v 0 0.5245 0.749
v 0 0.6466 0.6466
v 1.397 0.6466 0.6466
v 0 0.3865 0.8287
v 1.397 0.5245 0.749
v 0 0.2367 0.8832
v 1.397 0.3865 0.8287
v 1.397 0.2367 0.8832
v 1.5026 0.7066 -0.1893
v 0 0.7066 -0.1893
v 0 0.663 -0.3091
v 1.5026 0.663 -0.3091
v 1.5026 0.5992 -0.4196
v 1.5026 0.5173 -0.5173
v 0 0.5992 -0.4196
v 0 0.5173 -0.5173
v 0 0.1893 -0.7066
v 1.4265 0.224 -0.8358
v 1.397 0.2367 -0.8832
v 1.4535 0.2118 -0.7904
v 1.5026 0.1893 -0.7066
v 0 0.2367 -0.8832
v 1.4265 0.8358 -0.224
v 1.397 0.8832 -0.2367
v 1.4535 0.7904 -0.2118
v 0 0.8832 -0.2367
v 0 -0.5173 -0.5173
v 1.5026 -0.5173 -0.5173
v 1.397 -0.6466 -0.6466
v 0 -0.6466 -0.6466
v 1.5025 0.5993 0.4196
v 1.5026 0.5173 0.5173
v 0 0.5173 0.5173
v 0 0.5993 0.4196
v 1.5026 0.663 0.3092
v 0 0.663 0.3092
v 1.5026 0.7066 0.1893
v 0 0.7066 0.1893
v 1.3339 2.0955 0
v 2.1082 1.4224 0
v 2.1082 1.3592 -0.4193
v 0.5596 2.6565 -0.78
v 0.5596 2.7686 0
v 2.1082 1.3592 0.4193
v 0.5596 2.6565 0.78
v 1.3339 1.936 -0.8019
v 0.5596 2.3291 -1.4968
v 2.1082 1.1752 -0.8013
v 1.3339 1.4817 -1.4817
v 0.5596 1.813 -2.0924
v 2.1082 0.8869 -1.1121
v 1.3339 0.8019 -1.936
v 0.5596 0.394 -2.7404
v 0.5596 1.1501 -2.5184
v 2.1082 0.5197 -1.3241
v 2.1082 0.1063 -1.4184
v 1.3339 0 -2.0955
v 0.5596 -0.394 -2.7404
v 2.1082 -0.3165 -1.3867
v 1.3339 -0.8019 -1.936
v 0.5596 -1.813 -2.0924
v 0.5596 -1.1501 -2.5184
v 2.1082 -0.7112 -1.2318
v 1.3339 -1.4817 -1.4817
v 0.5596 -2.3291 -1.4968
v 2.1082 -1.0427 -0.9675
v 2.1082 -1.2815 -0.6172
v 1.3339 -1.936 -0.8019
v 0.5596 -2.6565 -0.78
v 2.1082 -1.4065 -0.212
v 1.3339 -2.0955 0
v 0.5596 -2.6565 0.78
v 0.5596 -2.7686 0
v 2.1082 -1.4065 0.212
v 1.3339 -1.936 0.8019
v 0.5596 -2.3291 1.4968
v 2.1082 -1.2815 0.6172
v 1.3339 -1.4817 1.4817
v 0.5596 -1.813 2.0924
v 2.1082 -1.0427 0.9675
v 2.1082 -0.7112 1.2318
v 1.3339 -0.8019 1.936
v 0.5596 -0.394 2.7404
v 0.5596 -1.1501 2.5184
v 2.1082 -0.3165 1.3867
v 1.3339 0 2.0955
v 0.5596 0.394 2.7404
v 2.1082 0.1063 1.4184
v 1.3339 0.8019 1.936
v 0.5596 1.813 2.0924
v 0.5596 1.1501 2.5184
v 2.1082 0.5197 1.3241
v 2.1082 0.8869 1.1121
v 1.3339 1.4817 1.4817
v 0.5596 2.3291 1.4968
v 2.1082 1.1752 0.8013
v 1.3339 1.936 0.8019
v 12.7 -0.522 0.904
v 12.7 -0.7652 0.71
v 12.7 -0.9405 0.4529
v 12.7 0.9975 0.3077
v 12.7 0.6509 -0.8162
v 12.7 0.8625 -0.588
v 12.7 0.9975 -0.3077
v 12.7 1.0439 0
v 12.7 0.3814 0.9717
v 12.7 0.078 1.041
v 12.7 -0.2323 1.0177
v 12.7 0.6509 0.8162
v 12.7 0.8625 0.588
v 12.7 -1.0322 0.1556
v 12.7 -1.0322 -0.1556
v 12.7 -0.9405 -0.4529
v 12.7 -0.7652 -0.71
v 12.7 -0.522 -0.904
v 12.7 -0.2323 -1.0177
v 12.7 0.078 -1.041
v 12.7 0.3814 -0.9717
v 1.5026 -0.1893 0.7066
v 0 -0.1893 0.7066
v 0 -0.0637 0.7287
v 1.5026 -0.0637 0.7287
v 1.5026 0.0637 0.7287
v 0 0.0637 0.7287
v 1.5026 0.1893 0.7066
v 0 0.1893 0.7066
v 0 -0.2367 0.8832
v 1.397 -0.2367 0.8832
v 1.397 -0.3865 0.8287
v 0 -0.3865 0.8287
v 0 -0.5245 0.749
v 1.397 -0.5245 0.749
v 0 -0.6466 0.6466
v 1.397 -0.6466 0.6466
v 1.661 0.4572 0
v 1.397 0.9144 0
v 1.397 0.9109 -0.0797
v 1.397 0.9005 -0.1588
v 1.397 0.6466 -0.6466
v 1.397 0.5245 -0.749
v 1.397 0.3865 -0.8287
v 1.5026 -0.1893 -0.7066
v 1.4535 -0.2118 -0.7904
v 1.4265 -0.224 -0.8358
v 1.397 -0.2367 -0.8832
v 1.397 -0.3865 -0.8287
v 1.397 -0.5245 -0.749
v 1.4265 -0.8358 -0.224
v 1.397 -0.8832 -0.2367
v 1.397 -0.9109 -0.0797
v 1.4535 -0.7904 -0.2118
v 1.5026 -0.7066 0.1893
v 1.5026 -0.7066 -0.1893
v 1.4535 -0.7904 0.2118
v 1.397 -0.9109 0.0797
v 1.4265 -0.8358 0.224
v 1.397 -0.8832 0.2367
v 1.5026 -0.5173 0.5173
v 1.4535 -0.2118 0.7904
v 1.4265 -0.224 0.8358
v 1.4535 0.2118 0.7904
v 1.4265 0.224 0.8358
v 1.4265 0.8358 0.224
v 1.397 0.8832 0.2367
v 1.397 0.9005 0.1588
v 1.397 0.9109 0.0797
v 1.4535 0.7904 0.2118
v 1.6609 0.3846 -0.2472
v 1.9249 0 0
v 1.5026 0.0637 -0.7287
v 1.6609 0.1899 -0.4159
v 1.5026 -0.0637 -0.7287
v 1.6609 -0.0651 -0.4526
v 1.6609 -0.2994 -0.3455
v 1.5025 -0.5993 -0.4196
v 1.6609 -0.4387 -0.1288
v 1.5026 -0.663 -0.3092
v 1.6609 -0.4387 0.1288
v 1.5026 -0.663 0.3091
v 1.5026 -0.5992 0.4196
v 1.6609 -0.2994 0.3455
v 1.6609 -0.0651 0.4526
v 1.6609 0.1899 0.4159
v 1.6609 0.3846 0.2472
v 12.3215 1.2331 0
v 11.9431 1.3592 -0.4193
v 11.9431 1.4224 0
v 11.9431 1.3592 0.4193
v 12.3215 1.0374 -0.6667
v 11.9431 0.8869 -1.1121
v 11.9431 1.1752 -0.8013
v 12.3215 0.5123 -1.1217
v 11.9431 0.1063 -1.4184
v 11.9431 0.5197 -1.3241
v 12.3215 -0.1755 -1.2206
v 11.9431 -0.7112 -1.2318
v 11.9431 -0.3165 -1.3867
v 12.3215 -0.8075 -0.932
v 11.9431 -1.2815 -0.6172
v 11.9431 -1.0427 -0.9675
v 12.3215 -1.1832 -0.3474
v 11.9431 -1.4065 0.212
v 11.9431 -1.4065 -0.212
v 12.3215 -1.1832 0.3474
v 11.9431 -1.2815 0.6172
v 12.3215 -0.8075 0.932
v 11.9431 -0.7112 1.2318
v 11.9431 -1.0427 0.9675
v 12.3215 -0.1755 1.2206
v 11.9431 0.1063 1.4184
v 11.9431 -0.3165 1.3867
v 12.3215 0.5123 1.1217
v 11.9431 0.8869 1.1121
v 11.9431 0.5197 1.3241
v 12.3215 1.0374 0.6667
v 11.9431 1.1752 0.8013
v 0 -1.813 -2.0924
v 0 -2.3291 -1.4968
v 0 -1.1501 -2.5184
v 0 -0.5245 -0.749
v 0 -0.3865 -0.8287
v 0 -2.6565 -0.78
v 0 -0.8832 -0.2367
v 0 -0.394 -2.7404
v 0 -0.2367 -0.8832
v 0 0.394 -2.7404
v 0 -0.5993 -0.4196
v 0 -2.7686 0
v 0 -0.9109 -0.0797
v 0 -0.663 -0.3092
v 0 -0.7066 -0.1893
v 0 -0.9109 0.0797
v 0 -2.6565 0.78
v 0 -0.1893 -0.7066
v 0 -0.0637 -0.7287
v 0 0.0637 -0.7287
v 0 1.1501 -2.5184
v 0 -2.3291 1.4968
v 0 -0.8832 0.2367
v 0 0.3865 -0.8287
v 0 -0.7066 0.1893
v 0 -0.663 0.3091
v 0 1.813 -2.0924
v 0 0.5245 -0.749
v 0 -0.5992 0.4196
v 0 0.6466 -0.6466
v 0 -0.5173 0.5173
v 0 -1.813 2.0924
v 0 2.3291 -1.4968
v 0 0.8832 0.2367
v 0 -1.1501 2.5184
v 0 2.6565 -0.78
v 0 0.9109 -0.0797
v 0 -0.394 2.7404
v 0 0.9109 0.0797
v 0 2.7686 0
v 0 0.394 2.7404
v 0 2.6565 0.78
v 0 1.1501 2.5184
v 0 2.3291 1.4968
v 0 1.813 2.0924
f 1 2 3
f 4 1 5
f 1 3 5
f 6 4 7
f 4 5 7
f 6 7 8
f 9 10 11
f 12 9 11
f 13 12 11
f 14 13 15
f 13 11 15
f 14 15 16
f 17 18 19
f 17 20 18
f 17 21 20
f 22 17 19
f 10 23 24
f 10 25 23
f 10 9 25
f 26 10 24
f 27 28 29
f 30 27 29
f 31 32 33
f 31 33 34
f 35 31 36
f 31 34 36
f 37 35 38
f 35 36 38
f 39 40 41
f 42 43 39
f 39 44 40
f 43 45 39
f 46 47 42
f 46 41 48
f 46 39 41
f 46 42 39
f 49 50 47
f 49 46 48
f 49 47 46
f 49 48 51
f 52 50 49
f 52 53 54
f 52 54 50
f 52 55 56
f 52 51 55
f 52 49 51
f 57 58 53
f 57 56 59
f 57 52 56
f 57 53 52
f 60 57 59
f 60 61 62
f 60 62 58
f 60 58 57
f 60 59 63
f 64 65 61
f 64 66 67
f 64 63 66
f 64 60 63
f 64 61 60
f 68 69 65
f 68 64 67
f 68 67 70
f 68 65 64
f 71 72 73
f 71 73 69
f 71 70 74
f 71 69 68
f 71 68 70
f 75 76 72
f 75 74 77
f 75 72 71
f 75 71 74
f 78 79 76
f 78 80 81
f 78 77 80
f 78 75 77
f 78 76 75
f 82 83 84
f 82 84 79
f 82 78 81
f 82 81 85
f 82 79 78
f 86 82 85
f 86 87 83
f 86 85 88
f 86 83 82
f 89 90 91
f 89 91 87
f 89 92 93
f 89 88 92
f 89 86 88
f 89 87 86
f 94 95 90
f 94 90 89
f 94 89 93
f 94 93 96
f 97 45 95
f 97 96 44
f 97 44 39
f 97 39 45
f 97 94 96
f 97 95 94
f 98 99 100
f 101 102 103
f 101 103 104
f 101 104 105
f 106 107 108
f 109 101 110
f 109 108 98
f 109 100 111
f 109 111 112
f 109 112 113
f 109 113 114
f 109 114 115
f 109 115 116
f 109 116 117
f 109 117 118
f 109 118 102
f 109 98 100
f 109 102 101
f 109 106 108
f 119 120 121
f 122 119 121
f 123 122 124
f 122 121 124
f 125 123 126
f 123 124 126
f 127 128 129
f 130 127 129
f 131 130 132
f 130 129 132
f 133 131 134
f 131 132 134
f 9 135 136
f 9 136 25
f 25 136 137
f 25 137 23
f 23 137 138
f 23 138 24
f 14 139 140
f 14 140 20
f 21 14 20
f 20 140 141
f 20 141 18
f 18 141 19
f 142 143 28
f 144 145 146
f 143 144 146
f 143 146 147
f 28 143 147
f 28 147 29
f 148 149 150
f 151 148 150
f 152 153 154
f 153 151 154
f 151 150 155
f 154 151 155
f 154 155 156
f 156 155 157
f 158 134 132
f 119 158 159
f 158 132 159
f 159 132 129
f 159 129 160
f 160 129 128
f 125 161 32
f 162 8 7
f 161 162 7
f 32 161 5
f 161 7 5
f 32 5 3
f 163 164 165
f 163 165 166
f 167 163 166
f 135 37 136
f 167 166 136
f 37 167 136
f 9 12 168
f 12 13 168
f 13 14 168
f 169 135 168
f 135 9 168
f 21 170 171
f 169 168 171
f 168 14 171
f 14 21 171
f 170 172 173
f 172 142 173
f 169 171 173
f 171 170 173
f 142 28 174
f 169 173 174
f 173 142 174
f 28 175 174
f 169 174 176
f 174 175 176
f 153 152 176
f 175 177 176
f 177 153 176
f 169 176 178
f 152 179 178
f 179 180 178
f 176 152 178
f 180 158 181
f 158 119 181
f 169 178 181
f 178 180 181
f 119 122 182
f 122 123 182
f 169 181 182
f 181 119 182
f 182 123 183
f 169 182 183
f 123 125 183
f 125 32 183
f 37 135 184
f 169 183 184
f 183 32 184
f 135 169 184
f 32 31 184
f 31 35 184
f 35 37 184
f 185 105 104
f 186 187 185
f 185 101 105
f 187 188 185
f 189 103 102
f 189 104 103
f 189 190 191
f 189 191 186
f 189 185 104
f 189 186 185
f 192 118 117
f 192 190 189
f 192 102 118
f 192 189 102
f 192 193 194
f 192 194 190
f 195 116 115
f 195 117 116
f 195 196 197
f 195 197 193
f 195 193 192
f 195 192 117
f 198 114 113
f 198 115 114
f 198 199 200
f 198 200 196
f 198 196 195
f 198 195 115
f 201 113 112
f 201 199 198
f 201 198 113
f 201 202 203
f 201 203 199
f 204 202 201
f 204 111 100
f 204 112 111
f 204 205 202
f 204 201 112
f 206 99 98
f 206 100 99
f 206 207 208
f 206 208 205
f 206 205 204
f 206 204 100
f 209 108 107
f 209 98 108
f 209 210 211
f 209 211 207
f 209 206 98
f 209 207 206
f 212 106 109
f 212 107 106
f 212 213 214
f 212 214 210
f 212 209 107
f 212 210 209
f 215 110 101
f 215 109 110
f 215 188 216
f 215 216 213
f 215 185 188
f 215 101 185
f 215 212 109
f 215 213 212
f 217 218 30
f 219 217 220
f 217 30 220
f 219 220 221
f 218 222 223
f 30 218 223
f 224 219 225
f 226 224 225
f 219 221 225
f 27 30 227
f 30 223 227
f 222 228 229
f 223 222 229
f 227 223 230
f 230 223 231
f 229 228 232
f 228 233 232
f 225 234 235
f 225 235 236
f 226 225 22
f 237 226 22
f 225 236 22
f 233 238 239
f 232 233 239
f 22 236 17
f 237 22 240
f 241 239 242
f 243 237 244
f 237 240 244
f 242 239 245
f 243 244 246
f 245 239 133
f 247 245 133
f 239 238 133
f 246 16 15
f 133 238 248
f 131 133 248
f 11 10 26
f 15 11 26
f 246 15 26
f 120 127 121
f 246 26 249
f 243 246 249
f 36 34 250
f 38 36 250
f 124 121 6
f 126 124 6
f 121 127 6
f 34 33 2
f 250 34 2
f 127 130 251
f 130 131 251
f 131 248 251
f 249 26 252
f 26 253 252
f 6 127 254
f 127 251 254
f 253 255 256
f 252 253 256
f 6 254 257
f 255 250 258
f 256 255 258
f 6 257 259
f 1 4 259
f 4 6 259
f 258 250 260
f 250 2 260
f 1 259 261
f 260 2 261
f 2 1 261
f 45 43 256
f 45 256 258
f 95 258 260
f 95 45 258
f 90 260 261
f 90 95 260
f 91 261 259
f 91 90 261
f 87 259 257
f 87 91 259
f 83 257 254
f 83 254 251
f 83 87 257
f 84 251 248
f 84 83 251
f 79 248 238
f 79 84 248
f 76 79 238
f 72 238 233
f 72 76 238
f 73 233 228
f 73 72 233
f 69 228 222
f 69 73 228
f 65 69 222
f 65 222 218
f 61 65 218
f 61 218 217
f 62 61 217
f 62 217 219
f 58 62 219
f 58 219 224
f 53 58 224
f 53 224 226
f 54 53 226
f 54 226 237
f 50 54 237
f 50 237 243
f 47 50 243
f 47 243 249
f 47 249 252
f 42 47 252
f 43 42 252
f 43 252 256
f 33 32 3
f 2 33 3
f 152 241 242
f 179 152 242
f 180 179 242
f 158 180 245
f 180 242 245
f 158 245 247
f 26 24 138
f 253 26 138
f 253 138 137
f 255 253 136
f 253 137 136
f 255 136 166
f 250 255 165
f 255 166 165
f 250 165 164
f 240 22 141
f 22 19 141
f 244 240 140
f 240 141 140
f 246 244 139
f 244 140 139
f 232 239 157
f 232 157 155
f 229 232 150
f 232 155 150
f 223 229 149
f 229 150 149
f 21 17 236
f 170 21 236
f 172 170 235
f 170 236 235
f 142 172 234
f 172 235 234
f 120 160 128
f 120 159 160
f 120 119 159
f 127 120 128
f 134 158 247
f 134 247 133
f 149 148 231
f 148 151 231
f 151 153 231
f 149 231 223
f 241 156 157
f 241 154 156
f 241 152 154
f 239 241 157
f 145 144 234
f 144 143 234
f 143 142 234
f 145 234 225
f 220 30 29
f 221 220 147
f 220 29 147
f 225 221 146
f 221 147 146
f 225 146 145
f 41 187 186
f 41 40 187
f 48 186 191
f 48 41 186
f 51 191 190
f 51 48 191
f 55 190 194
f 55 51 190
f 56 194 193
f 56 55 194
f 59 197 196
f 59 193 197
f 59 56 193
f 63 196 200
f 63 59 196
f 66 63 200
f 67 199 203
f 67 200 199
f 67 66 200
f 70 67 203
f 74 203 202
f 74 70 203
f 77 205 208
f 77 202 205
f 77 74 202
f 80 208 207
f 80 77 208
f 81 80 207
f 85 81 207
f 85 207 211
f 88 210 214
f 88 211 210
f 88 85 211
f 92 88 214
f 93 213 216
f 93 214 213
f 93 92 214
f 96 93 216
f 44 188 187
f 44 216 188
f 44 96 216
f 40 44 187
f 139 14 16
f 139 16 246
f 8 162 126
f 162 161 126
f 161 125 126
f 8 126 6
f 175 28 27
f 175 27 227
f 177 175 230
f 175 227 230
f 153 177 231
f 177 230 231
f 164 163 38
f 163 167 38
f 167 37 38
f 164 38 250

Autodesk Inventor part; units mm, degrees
ref_plane "YZ Plane" through (0, 0, 0) normal (1, 0, 0) x (0, 1, 0)
ref_plane "XZ Plane" through (0, 0, 0) normal (0, 1, 0) x (-1, 0, 0)
sketch "Sketch1" plane through (0, 0, 0) normal (0, 0, 1) x (1, 0, 0)
  line L0 (12.7, 0) -> (12.7, 1.4224)
  line L1 (12.7, 1.4224) -> (2.1082, 1.4224)
  line L2 (0, 2.7686) -> (0, 0.9144)
  line L3 (0, 0.9144) -> (1.397, 0.9144)
  line L4 (1.397, 0.9144) -> (1.9249, 0)
  line L5 (1.9249, 0) -> (12.7, 0)
  line L6 (0, 2.7686) -> (0.5596, 2.7686)
  line L7 (0.5596, 2.7686) -> (2.1082, 1.4224)
  line L8 (-2.54, 0) -> (15.24, 0) projected
  line L9 (0, -0.5537) -> (0, 3.3223) projected
  dimension "d0" = 12.7
  dimension "d1" = 1.397
  dimension "d2" = 2.8448
  dimension "d3" = 2.1082
  dimension "d4" = 41
  dimension "d5" = 1.8288
  dimension "d6" = 60
  dimension "d7" = 5.5372
revolve "Body" add sketch "Sketch1" angle 360 about axis through (1.9249, 0, 0) along (1, 0, 0) contours L5 L4 L3 L2 L6 L7 L1 L0
sketch "Sketch2" plane through (0, 0, 0) normal (-1, 0, 0) x (0, 0, 1)
  circle A0 centre (0, 0) radius 2.7686 projected
  circle A1 centre (0, 0) radius 0.9144 projected
  line L0 (0.7066, 0.1893) -> (0.8832, 0.2367)
  line L1 (0.7066, -0.1893) -> (0.8832, -0.2367)
  arc A2 (0.7066, -0.1893) -> (0.7066, 0.1893) centre (0, 0) ccw
  arc A3 (0.8832, -0.2367) -> (0.8832, 0.2367) centre (0, 0) ccw
  line L2 (0, -3.876) -> (0, 3.876) projected
  line L3 (-3.876, 0) -> (3.876, 0) projected
  line L4 (0.7066, 0.1893) -> (0, 0) construction
  line L5 (0, 0) -> (0.7066, -0.1893) construction
  line L6 (0.1893, 0.7066) -> (0.2367, 0.8832)
  line L7 (0.5173, 0.5173) -> (0.6466, 0.6466)
  arc A4 (0.5173, 0.5173) -> (0.1893, 0.7066) centre (0, 0) ccw
  arc A5 (0.6466, 0.6466) -> (0.2367, 0.8832) centre (0, 0) ccw
  line L8 (-0.5173, 0.5173) -> (-0.6466, 0.6466)
  line L9 (-0.1893, 0.7066) -> (-0.2367, 0.8832)
  arc A6 (-0.1893, 0.7066) -> (-0.5173, 0.5173) centre (0, 0) ccw
  arc A7 (-0.2367, 0.8832) -> (-0.6466, 0.6466) centre (0, 0) ccw
  line L10 (-0.7066, -0.1893) -> (-0.8832, -0.2367)
  line L11 (-0.7066, 0.1893) -> (-0.8832, 0.2367)
  arc A8 (-0.7066, 0.1893) -> (-0.7066, -0.1893) centre (0, 0) ccw
  arc A9 (-0.8832, 0.2367) -> (-0.8832, -0.2367) centre (0, 0) ccw
  line L12 (-0.1893, -0.7066) -> (-0.2367, -0.8832)
  line L13 (-0.5173, -0.5173) -> (-0.6466, -0.6466)
  arc A10 (-0.5173, -0.5173) -> (-0.1893, -0.7066) centre (0, 0) ccw
  arc A11 (-0.6466, -0.6466) -> (-0.2367, -0.8832) centre (0, 0) ccw
  line L14 (0.5173, -0.5173) -> (0.6466, -0.6466)
  line L15 (0.1893, -0.7066) -> (0.2367, -0.8832)
  arc A12 (0.1893, -0.7066) -> (0.5173, -0.5173) centre (0, 0) ccw
  arc A13 (0.2367, -0.8832) -> (0.6466, -0.6466) centre (0, 0) ccw
  dimension "d8" = 1.463
  dimension "d9" = 1.8288
  dimension "d10" = 15
  dimension "d11" = 15
  dimension "d22" = 360
extrude "Slot" add sketch "Sketch2" against normal up to next contours L3 A2 L0 A1 | A1 L1 A2 L3 | L3 A8 L10 A1 | A1 L11 A8 L3 | A1 L7 A4 L6 | L9 A6 L8 A1 | A1 L13 A10 L12 | L15 A12 L14 A1
thread "Thread" size "4-40 UNC" class "2A" standard "ANSI Unified Screw Threads" length 9.0043
chamfer "Chamfer1" distance 0.3785 distance2 0.7569 1 edges at (12.7, -1.4224, 0) measured on face at (12.7, -0.1681, 0.4433)
ref_plane "Work Plane1" through (66.6877, 0, 0) normal (0, 0, -1) x (1, 0, 0)
equation "\"d0\" = NLG"
equation "\"d1\" = INTI"
equation "\"d2\" = GD"
equation "\"d3\" = KOH"
equation "\"d4\" = 0.5 * SEWI"
equation "\"d5\" = SW"
equation "\"d7\" = KOD"
equation "\"d8\" = 0.8 * SW"
equation "\"d9\" = SW"
equation "\"d15\" = GEL"
equation "\"d17\" = -0.5 * SPD + 0.5 * GD"
equation "\"d18\" = GUL"
equation "\"NLG\" = 12.7"
equation "\"SW\" = 1.8288"
equation "\"INTI\" = 1.397"
equation "\"GEL\" = 9.0043"
equation "\"KOH\" = 2.1082"
equation "\"KOD\" = 5.5372"
equation "\"GUL\" = 0.75692"
equation "\"SPD\" = 2.08788"
equation "\"GD\" = NND"
equation "\"SEWI\" = 82deg"
equation "\"TOA\" = 30deg"
equation "\"GD1\" = SPD"
equation "\"EPV\" = 3.74448"
equation "\"THREADDIA\" = 2.8448"
equation "\"BDM\" = NND"
equation "\"NND\" = 2.8448"
equation "\"GAL\" = 1.5875"
equation "\"E0\" = 1.155 * SW"
properties part number "ANSI B18.3 - 4-40 UNC x 0.5, SSFCHCSI" material "Steel, Mild"
